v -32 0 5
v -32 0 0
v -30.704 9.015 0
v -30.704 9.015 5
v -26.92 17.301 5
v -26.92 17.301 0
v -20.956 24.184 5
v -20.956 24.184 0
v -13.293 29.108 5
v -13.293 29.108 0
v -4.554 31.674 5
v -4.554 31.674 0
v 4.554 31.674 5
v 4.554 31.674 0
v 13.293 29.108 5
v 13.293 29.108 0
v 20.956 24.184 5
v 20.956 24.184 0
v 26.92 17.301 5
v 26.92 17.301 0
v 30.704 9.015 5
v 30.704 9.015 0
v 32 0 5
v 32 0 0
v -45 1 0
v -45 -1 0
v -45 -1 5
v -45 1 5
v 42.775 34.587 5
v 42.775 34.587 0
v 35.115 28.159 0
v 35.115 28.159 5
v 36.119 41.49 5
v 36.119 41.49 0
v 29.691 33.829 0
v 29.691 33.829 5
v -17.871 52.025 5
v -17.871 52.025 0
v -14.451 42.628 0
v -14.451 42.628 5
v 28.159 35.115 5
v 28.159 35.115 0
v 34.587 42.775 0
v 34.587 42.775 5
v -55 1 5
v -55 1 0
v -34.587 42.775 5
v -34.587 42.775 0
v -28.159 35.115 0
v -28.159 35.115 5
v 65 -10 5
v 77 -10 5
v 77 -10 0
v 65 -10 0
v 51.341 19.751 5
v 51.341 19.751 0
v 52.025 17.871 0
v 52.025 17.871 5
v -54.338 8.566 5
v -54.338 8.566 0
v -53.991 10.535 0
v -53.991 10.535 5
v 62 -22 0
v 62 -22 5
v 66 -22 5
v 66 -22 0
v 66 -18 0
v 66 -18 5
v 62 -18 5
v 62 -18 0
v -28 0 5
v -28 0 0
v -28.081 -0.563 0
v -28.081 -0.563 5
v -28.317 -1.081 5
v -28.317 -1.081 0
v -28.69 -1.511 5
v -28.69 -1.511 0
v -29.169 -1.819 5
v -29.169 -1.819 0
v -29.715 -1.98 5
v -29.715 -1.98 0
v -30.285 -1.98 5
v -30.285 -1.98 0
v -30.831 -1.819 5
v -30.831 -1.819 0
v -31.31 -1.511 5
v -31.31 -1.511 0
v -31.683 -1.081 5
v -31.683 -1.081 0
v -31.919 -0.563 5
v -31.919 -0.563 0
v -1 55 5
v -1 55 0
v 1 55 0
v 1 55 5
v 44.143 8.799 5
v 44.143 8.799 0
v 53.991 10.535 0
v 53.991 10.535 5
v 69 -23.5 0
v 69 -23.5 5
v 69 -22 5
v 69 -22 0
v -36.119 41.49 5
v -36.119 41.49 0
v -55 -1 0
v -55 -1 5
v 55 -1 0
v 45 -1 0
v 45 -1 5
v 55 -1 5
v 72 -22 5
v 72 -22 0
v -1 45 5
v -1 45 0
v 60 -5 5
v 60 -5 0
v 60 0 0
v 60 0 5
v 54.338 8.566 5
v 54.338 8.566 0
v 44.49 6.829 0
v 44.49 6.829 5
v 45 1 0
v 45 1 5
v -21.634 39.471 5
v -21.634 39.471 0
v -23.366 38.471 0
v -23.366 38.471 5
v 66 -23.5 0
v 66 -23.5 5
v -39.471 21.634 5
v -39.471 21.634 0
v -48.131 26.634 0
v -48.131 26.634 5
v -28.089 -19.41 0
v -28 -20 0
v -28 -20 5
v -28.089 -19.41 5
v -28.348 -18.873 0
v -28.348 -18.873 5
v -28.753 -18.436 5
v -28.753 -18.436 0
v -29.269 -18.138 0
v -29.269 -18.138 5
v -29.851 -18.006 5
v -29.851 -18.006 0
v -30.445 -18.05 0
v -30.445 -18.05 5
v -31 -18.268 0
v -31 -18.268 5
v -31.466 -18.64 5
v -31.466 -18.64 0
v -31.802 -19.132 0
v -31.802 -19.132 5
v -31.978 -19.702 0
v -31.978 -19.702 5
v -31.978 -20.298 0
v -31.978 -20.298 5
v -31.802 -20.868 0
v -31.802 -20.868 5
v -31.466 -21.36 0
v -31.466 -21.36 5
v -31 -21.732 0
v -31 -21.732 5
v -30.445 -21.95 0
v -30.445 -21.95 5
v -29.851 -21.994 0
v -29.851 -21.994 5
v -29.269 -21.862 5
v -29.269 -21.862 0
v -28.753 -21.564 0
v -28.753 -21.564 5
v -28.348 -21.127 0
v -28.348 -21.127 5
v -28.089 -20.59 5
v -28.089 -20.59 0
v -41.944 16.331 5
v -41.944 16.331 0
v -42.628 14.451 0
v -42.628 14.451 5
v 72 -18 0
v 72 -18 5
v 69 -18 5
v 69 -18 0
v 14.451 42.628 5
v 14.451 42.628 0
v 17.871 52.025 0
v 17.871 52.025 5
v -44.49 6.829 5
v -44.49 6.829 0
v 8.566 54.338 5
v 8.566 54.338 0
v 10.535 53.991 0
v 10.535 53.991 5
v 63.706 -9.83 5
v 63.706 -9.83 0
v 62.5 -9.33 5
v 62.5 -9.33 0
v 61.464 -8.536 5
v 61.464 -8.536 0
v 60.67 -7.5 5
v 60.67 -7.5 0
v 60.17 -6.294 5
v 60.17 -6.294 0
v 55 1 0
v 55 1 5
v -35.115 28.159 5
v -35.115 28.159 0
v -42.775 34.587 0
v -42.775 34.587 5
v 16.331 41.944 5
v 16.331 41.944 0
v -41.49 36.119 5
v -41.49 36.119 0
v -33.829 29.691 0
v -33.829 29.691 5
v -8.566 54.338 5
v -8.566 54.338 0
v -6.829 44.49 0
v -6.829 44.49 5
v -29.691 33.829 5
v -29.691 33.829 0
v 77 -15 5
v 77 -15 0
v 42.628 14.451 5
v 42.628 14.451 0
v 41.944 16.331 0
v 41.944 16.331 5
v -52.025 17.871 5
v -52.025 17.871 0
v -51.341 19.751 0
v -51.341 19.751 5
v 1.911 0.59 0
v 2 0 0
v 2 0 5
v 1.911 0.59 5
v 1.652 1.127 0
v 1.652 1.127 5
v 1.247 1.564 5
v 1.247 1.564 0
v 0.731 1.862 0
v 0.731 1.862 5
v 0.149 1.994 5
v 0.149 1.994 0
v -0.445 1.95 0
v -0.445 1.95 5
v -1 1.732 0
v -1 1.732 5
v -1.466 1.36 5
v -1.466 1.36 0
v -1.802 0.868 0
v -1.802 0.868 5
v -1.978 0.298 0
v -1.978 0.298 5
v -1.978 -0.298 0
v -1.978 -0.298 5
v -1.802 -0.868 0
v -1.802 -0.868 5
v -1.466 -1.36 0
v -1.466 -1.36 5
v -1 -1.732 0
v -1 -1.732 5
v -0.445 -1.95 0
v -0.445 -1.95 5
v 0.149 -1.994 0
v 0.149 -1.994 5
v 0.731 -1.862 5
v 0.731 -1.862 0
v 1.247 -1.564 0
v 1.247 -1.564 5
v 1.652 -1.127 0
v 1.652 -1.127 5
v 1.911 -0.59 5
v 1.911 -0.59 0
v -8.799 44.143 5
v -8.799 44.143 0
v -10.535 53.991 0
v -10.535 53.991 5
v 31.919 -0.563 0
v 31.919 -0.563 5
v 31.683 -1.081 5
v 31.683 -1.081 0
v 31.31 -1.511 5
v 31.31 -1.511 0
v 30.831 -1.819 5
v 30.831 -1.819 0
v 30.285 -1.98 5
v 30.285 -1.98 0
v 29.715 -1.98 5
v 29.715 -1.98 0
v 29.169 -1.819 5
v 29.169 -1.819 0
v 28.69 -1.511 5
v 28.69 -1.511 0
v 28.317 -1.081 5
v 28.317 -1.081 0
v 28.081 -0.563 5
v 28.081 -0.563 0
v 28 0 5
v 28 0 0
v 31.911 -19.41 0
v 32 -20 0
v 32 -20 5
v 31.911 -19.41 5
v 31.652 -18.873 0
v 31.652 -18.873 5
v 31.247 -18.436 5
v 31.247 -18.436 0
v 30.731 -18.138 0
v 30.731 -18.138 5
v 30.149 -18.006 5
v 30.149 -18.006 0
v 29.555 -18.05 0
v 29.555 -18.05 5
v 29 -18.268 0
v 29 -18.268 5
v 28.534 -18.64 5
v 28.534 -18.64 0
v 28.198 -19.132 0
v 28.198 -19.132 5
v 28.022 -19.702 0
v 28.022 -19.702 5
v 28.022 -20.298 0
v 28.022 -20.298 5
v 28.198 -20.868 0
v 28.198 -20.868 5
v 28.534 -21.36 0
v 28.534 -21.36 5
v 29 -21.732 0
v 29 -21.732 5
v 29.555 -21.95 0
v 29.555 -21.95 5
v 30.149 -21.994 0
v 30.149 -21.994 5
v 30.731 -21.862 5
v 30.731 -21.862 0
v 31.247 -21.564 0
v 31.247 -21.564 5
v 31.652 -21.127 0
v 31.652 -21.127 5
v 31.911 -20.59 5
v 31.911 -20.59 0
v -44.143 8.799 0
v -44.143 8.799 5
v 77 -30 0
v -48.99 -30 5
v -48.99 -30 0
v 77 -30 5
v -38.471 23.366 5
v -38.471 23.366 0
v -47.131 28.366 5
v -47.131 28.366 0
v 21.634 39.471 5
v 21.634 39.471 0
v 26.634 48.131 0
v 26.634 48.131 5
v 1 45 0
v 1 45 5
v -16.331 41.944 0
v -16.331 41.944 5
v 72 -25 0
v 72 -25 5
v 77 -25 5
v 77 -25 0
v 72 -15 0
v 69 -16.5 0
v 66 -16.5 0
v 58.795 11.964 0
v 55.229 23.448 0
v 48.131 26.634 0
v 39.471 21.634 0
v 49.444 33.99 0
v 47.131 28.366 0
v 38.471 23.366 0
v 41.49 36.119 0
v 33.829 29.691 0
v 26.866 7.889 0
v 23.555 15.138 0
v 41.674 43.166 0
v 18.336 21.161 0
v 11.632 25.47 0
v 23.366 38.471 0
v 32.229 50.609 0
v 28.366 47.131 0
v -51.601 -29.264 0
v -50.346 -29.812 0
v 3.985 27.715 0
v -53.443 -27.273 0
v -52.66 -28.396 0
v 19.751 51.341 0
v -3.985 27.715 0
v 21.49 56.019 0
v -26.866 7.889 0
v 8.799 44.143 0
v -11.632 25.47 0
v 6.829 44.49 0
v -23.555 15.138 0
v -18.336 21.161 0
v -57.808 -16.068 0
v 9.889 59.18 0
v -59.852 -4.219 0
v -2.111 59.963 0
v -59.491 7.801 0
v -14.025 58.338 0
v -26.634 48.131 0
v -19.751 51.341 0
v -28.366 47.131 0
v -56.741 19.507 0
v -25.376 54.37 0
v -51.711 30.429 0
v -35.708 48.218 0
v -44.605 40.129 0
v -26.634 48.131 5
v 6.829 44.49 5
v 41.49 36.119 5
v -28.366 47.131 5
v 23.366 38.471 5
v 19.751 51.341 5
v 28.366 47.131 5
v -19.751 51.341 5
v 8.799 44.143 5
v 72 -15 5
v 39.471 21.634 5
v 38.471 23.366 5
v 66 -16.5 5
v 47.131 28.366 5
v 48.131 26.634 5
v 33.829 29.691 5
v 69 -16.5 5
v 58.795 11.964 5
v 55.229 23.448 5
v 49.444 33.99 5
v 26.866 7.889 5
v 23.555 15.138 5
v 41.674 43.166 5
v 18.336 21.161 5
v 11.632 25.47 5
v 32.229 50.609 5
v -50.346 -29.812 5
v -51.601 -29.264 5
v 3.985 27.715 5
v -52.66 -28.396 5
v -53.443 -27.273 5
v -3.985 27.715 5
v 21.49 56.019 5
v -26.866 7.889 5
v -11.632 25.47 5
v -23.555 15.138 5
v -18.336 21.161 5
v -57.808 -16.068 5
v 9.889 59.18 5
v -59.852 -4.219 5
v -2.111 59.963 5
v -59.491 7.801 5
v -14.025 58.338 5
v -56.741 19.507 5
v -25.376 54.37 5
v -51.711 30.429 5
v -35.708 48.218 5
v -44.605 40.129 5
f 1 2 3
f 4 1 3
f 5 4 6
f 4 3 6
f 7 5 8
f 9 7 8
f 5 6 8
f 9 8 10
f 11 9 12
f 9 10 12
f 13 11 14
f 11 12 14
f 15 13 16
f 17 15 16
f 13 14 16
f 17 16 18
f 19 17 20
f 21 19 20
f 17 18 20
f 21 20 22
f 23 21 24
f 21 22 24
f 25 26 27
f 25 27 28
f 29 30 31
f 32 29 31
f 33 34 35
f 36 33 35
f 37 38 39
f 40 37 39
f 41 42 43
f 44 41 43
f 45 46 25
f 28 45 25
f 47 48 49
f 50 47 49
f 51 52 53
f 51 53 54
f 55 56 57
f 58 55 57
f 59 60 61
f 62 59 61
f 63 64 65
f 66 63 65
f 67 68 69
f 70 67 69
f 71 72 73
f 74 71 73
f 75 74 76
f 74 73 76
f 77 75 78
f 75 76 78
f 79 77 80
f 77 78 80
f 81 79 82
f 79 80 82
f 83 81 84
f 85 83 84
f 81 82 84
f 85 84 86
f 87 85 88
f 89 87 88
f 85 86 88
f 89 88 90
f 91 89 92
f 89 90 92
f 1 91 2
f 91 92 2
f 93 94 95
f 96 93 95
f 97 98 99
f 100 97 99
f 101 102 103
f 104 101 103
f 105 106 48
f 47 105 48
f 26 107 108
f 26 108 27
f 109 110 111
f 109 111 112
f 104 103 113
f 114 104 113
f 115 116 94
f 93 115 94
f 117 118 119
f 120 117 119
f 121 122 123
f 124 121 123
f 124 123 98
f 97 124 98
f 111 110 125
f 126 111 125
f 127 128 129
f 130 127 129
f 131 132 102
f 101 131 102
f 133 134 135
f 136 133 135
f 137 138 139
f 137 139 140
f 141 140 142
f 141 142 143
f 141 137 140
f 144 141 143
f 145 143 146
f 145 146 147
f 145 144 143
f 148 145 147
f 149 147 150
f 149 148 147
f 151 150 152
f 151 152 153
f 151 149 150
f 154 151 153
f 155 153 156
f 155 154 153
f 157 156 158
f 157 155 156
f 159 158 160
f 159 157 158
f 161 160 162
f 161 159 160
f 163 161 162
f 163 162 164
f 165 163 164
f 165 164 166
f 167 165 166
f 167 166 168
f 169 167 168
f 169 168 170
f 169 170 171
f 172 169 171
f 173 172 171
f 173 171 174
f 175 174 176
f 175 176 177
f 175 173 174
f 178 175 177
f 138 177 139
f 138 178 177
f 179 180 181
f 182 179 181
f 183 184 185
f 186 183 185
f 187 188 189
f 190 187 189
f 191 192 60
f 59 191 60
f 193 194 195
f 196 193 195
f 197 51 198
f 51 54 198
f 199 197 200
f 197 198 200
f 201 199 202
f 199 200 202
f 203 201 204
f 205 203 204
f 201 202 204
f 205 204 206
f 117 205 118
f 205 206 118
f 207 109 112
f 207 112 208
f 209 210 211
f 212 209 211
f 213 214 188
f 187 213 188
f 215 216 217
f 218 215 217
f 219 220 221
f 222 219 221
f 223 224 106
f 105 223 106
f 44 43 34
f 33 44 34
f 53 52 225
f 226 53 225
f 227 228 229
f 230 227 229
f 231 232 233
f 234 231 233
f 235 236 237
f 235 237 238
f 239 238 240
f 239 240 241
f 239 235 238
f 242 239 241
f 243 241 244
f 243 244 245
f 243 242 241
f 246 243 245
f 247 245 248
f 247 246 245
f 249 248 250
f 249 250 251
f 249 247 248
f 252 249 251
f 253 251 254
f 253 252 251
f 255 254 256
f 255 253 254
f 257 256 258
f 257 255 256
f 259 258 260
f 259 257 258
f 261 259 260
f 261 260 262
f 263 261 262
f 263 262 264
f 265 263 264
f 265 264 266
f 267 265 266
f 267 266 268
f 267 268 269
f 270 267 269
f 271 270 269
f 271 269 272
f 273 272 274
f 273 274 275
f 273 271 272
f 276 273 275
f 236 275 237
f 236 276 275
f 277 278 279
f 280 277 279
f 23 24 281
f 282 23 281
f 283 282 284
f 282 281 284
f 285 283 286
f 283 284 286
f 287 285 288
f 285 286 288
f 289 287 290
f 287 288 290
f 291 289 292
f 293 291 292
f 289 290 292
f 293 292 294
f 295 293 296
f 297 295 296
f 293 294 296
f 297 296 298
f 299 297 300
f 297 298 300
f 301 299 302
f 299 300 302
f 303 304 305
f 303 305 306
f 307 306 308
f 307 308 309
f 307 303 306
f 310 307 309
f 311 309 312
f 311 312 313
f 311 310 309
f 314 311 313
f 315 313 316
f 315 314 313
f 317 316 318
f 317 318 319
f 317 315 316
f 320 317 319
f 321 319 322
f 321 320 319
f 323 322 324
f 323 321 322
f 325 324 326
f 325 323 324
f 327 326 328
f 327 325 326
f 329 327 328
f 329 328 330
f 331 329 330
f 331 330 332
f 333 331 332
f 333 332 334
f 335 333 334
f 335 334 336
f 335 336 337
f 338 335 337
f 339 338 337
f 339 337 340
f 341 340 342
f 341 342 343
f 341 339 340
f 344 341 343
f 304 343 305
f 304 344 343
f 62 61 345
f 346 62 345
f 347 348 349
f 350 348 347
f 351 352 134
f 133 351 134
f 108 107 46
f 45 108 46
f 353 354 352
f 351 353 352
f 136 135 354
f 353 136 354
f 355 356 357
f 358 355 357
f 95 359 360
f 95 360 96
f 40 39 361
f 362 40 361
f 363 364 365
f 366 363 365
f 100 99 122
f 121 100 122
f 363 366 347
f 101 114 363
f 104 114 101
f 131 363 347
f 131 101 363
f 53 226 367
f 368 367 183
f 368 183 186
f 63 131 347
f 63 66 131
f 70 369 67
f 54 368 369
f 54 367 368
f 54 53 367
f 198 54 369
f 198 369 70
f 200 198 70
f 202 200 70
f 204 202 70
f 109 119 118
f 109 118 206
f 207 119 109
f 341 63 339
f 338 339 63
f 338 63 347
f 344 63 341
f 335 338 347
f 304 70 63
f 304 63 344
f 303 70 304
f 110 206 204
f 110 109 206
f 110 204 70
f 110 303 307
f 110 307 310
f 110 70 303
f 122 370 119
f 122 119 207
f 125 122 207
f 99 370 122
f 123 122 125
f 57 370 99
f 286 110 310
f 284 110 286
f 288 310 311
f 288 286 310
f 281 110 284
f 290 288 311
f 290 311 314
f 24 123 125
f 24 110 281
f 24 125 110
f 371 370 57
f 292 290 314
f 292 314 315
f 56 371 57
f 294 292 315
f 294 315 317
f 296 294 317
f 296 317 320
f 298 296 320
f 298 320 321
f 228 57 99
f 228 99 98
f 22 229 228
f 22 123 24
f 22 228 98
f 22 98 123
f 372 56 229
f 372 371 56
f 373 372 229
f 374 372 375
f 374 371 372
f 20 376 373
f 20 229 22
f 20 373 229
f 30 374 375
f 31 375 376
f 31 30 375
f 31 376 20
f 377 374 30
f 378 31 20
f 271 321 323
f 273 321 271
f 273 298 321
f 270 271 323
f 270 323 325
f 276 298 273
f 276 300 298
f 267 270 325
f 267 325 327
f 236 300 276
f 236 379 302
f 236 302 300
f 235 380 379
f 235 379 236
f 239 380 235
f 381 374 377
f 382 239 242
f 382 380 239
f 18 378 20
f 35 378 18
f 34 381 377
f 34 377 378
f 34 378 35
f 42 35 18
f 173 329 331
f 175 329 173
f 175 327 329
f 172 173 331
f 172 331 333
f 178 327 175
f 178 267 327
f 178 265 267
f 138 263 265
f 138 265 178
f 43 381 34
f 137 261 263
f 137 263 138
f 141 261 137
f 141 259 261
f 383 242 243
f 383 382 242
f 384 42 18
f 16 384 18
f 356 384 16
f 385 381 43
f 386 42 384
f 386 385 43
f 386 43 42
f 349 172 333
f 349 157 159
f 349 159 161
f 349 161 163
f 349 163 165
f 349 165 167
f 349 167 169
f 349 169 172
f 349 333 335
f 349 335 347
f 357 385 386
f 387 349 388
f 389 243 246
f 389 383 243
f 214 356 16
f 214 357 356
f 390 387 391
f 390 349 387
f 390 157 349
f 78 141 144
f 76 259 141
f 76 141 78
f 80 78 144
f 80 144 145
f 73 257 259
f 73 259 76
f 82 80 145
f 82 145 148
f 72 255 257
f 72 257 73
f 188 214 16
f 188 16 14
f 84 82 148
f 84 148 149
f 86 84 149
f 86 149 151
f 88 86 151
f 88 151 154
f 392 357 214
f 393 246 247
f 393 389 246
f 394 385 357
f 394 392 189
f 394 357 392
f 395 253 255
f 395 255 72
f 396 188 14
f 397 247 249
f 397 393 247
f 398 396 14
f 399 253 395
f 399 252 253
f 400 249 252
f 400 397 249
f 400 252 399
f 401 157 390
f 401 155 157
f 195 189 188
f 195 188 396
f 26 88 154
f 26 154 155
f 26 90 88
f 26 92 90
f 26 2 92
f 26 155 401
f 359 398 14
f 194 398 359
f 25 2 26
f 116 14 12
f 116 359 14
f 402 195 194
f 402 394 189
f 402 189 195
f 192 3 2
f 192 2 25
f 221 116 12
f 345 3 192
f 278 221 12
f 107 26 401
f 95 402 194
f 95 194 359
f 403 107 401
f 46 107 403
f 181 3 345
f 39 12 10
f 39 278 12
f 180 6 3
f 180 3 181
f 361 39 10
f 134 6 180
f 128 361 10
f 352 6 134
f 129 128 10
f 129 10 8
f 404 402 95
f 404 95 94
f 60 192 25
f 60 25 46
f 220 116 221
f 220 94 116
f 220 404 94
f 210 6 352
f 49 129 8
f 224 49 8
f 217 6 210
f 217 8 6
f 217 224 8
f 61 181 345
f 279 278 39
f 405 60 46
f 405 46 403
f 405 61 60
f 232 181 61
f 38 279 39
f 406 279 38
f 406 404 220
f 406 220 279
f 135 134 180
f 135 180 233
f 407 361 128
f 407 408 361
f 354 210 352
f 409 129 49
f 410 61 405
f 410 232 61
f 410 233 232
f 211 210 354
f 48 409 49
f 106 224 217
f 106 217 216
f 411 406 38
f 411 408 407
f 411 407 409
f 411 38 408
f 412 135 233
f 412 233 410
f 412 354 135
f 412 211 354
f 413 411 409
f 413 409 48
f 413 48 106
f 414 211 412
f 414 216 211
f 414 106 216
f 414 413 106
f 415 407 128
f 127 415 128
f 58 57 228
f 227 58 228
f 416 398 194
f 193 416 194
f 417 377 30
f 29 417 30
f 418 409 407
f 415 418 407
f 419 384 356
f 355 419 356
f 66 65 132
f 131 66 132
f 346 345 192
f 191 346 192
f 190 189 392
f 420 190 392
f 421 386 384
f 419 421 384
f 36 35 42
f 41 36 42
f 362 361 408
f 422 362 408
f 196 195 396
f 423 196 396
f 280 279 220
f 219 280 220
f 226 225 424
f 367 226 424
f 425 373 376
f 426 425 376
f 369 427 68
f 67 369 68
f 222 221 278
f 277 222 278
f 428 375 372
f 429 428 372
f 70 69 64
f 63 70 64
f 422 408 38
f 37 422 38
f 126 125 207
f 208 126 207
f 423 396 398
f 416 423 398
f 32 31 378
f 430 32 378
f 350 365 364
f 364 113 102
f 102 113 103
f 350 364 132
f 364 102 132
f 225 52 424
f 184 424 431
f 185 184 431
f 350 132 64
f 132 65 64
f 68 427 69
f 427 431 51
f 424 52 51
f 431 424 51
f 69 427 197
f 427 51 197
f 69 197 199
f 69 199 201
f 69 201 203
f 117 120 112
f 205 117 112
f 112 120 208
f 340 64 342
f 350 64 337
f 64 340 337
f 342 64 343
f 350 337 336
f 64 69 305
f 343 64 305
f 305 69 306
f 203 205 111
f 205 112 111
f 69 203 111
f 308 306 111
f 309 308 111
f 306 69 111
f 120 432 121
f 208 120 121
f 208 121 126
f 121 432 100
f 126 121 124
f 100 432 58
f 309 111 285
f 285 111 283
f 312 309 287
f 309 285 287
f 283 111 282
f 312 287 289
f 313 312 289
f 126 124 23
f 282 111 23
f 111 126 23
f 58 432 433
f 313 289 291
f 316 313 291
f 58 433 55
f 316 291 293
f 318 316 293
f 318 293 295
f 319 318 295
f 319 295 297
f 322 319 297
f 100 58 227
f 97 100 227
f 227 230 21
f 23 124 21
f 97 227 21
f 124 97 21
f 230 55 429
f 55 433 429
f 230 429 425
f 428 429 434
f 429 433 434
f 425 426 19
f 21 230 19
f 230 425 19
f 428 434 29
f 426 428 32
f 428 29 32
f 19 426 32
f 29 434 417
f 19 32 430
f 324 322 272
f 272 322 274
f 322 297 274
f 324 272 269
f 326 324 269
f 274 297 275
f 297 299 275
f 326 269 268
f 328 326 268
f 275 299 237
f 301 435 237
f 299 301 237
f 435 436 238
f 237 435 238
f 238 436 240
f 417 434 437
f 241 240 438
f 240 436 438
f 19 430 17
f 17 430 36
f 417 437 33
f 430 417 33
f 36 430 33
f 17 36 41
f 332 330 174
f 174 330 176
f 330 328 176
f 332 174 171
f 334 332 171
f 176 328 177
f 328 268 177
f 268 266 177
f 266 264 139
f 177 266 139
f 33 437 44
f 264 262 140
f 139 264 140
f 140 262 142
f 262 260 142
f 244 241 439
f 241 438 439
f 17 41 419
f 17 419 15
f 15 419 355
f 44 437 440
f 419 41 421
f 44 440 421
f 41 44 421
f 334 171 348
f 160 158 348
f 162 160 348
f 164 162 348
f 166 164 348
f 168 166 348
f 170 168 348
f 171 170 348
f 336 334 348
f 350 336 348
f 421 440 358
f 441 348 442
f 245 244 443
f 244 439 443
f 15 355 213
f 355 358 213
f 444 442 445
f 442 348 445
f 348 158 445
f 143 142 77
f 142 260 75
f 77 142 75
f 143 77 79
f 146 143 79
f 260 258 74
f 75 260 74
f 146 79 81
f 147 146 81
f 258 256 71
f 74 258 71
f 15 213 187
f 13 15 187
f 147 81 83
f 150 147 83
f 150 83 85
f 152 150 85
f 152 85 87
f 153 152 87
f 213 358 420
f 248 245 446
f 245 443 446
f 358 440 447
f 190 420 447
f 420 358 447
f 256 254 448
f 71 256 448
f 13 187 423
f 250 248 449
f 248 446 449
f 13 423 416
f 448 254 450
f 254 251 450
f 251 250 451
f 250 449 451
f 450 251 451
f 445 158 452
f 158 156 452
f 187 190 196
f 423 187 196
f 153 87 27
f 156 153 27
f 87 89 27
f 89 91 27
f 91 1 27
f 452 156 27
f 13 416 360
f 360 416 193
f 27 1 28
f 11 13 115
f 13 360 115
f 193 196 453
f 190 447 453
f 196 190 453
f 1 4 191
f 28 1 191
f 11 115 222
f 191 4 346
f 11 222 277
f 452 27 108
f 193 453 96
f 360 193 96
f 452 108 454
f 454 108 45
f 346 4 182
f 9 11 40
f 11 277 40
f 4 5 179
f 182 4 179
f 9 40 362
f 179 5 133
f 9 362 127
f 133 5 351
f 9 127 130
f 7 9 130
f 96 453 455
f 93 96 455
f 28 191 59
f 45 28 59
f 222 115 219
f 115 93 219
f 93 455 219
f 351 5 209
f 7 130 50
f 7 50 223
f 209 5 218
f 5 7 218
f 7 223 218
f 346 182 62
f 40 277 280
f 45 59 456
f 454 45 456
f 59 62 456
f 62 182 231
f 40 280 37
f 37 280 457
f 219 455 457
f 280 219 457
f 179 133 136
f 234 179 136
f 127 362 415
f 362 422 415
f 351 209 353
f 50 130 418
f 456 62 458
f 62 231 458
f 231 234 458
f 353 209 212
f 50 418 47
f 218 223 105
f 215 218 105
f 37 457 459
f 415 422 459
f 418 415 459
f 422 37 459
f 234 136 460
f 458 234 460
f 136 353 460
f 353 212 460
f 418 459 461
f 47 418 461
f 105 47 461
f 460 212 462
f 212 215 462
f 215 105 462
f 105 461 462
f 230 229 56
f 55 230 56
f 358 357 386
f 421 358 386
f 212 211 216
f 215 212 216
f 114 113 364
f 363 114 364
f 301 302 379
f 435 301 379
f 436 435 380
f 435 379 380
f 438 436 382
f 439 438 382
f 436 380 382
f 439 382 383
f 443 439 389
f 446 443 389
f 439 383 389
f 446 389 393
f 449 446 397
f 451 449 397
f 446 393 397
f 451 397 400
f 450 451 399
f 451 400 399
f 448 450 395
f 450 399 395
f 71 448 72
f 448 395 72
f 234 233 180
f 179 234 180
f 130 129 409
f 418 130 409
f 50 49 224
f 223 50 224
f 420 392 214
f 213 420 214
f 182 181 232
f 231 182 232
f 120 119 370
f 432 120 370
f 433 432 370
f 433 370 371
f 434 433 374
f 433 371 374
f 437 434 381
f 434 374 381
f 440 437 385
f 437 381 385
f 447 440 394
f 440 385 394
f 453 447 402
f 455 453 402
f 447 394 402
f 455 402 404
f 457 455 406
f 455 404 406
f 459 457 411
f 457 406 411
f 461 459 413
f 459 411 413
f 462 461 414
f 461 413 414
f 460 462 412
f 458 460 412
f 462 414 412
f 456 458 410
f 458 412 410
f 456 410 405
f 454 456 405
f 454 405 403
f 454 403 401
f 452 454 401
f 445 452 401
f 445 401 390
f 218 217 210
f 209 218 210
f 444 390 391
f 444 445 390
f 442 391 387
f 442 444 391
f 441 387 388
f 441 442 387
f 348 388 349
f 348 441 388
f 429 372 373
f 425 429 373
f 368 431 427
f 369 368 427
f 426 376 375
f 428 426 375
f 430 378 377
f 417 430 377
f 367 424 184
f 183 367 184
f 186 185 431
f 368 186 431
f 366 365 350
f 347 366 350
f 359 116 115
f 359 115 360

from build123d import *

# Parameters (mm, degrees)
BOSS_EXTRU_1_OUTLINE_R   = 2
BOSS_EXTRU_1_OUTLINE_W   = 10
BOSS_EXTRU_1_OUTLINE_H   = 2
BOSS_EXTRU_1_OUTLINE_W_2 = 2
BOSS_EXTRU_1_OUTLINE_H_2 = 10
BOSS_EXTRU_1_DEPTH       = 5
BOSS_EXTRU_2_DEPTH       = 5
CONG_1_R                 = 5


with BuildPart() as part:
    # Boss.-Extru.1: read off the stored shape, not the designer's step
    # Boss.-Extru.1 outline → Boss.-Extru.1 (new body)
    with BuildSketch(Plane.XY):
        with BuildLine():
            ThreePointArc((60, 0), (-15.529142706, 57.955549577), (-51.961524227, -30))
            Line((-51.961524227, -30), (60, -30))
            Line((60, -30), (60, 0))
        make_face()
        with Locations((-30, -20)):
            Circle(BOSS_EXTRU_1_OUTLINE_R, mode=Mode.SUBTRACT)
        with Locations((-50, 0)):
            Rectangle(BOSS_EXTRU_1_OUTLINE_W, BOSS_EXTRU_1_OUTLINE_H, mode=Mode.SUBTRACT)
        Polygon((-53.990778238, 10.535457525), (-44.142700708, 8.798975748), (-44.489997063, 6.829360242), (-54.338074593, 8.565842019), align=None, mode=Mode.SUBTRACT)
        Circle(BOSS_EXTRU_1_OUTLINE_R, mode=Mode.SUBTRACT)
        with Locations((30, -20)):
            Circle(BOSS_EXTRU_1_OUTLINE_R, mode=Mode.SUBTRACT)
        with Locations((50, 0)):
            Rectangle(BOSS_EXTRU_1_OUTLINE_W, BOSS_EXTRU_1_OUTLINE_H, mode=Mode.SUBTRACT)
        Polygon((54.338074593, 8.565842019), (44.489997063, 6.829360242), (44.142700708, 8.798975748), (53.990778238, 10.535457525), align=None, mode=Mode.SUBTRACT)
        Polygon((-51.341074, 19.750800504), (-41.944147792, 16.33059907), (-42.628188079, 14.451213829), (-52.025114287, 17.871415262), align=None, mode=Mode.SUBTRACT)
        Polygon((-47.131397208, 28.366025404), (-38.47114317, 23.366025404), (-39.47114317, 21.633974596), (-48.131397208, 26.633974596), align=None, mode=Mode.SUBTRACT)
        Polygon((-41.489656762, 36.119362976), (-33.829212331, 29.691486879), (-35.11478755, 28.159397993), (-42.775231981, 34.58727409), align=None, mode=Mode.SUBTRACT)
        with BuildLine():
            ThreePointArc((-28, 0), (-30, -2), (-32, 0))
            ThreePointArc((-32, 0), (0, 32), (32, 0))
            ThreePointArc((32, 0), (30, -2), (28, 0))
            ThreePointArc((28, 0), (0, 28), (-28, 0))
        make_face(mode=Mode.SUBTRACT)
        Polygon((-34.58727409, 42.775231981), (-28.159397993, 35.11478755), (-29.691486879, 33.829212331), (-36.119362976, 41.489656762), align=None, mode=Mode.SUBTRACT)
        Polygon((-26.633974596, 48.131397208), (-21.633974596, 39.47114317), (-23.366025404, 38.47114317), (-28.366025404, 47.131397208), align=None, mode=Mode.SUBTRACT)
        Polygon((-17.871415262, 52.025114287), (-14.451213829, 42.628188079), (-16.33059907, 41.944147792), (-19.750800504, 51.341074), align=None, mode=Mode.SUBTRACT)
        Polygon((-8.565842019, 54.338074593), (-6.829360242, 44.489997063), (-8.798975748, 44.142700708), (-10.535457525, 53.990778238), align=None, mode=Mode.SUBTRACT)
        with Locations((0, 50)):
            Rectangle(BOSS_EXTRU_1_OUTLINE_W_2, BOSS_EXTRU_1_OUTLINE_H_2, mode=Mode.SUBTRACT)
        Polygon((48.131397208, 26.633974596), (39.47114317, 21.633974596), (38.47114317, 23.366025404), (47.131397208, 28.366025404), align=None, mode=Mode.SUBTRACT)
        Polygon((52.025114287, 17.871415262), (42.628188079, 14.451213829), (41.944147792, 16.33059907), (51.341074, 19.750800504), align=None, mode=Mode.SUBTRACT)
        Polygon((42.775231981, 34.58727409), (35.11478755, 28.159397993), (33.829212331, 29.691486879), (41.489656762, 36.119362976), align=None, mode=Mode.SUBTRACT)
        Polygon((19.750800504, 51.341074), (16.33059907, 41.944147792), (14.451213829, 42.628188079), (17.871415262, 52.025114287), align=None, mode=Mode.SUBTRACT)
        Polygon((28.366025404, 47.131397208), (23.366025404, 38.47114317), (21.633974596, 39.47114317), (26.633974596, 48.131397208), align=None, mode=Mode.SUBTRACT)
        Polygon((10.535457525, 53.990778238), (8.798975748, 44.142700708), (6.829360242, 44.489997063), (8.565842019, 54.338074593), align=None, mode=Mode.SUBTRACT)
        Polygon((36.119362976, 41.489656762), (29.691486879, 33.829212331), (28.159397993, 35.11478755), (34.58727409, 42.775231981), align=None, mode=Mode.SUBTRACT)
    extrude(amount=BOSS_EXTRU_1_DEPTH)

    # Esquisse2 → Boss.-Extru.2 (add)
    with BuildSketch(Plane.XY.offset(5)):
        Polygon((69, -22), (72, -22), (72, -25), (77, -25), (77, -30), (72, -30), (60, -30), (60, -10), (72, -10), (77, -10), (77, -15), (72, -15), (72, -18), (69, -18), (69, -16.5), (66, -16.5), (66, -18), (62, -18), (62, -22), (66, -22), (66, -23.5), (69, -23.5), align=None)
    extrude(amount=-BOSS_EXTRU_2_DEPTH)

    # Congé1
    cong_1_edges = [part.edges().sort_by_distance(p)[0] for p in [
        (-51.961524227, -30, 2.5),
        (60, -10, 2.5),
    ]]
    fillet(cong_1_edges, radius=CONG_1_R)


solid = part.part
